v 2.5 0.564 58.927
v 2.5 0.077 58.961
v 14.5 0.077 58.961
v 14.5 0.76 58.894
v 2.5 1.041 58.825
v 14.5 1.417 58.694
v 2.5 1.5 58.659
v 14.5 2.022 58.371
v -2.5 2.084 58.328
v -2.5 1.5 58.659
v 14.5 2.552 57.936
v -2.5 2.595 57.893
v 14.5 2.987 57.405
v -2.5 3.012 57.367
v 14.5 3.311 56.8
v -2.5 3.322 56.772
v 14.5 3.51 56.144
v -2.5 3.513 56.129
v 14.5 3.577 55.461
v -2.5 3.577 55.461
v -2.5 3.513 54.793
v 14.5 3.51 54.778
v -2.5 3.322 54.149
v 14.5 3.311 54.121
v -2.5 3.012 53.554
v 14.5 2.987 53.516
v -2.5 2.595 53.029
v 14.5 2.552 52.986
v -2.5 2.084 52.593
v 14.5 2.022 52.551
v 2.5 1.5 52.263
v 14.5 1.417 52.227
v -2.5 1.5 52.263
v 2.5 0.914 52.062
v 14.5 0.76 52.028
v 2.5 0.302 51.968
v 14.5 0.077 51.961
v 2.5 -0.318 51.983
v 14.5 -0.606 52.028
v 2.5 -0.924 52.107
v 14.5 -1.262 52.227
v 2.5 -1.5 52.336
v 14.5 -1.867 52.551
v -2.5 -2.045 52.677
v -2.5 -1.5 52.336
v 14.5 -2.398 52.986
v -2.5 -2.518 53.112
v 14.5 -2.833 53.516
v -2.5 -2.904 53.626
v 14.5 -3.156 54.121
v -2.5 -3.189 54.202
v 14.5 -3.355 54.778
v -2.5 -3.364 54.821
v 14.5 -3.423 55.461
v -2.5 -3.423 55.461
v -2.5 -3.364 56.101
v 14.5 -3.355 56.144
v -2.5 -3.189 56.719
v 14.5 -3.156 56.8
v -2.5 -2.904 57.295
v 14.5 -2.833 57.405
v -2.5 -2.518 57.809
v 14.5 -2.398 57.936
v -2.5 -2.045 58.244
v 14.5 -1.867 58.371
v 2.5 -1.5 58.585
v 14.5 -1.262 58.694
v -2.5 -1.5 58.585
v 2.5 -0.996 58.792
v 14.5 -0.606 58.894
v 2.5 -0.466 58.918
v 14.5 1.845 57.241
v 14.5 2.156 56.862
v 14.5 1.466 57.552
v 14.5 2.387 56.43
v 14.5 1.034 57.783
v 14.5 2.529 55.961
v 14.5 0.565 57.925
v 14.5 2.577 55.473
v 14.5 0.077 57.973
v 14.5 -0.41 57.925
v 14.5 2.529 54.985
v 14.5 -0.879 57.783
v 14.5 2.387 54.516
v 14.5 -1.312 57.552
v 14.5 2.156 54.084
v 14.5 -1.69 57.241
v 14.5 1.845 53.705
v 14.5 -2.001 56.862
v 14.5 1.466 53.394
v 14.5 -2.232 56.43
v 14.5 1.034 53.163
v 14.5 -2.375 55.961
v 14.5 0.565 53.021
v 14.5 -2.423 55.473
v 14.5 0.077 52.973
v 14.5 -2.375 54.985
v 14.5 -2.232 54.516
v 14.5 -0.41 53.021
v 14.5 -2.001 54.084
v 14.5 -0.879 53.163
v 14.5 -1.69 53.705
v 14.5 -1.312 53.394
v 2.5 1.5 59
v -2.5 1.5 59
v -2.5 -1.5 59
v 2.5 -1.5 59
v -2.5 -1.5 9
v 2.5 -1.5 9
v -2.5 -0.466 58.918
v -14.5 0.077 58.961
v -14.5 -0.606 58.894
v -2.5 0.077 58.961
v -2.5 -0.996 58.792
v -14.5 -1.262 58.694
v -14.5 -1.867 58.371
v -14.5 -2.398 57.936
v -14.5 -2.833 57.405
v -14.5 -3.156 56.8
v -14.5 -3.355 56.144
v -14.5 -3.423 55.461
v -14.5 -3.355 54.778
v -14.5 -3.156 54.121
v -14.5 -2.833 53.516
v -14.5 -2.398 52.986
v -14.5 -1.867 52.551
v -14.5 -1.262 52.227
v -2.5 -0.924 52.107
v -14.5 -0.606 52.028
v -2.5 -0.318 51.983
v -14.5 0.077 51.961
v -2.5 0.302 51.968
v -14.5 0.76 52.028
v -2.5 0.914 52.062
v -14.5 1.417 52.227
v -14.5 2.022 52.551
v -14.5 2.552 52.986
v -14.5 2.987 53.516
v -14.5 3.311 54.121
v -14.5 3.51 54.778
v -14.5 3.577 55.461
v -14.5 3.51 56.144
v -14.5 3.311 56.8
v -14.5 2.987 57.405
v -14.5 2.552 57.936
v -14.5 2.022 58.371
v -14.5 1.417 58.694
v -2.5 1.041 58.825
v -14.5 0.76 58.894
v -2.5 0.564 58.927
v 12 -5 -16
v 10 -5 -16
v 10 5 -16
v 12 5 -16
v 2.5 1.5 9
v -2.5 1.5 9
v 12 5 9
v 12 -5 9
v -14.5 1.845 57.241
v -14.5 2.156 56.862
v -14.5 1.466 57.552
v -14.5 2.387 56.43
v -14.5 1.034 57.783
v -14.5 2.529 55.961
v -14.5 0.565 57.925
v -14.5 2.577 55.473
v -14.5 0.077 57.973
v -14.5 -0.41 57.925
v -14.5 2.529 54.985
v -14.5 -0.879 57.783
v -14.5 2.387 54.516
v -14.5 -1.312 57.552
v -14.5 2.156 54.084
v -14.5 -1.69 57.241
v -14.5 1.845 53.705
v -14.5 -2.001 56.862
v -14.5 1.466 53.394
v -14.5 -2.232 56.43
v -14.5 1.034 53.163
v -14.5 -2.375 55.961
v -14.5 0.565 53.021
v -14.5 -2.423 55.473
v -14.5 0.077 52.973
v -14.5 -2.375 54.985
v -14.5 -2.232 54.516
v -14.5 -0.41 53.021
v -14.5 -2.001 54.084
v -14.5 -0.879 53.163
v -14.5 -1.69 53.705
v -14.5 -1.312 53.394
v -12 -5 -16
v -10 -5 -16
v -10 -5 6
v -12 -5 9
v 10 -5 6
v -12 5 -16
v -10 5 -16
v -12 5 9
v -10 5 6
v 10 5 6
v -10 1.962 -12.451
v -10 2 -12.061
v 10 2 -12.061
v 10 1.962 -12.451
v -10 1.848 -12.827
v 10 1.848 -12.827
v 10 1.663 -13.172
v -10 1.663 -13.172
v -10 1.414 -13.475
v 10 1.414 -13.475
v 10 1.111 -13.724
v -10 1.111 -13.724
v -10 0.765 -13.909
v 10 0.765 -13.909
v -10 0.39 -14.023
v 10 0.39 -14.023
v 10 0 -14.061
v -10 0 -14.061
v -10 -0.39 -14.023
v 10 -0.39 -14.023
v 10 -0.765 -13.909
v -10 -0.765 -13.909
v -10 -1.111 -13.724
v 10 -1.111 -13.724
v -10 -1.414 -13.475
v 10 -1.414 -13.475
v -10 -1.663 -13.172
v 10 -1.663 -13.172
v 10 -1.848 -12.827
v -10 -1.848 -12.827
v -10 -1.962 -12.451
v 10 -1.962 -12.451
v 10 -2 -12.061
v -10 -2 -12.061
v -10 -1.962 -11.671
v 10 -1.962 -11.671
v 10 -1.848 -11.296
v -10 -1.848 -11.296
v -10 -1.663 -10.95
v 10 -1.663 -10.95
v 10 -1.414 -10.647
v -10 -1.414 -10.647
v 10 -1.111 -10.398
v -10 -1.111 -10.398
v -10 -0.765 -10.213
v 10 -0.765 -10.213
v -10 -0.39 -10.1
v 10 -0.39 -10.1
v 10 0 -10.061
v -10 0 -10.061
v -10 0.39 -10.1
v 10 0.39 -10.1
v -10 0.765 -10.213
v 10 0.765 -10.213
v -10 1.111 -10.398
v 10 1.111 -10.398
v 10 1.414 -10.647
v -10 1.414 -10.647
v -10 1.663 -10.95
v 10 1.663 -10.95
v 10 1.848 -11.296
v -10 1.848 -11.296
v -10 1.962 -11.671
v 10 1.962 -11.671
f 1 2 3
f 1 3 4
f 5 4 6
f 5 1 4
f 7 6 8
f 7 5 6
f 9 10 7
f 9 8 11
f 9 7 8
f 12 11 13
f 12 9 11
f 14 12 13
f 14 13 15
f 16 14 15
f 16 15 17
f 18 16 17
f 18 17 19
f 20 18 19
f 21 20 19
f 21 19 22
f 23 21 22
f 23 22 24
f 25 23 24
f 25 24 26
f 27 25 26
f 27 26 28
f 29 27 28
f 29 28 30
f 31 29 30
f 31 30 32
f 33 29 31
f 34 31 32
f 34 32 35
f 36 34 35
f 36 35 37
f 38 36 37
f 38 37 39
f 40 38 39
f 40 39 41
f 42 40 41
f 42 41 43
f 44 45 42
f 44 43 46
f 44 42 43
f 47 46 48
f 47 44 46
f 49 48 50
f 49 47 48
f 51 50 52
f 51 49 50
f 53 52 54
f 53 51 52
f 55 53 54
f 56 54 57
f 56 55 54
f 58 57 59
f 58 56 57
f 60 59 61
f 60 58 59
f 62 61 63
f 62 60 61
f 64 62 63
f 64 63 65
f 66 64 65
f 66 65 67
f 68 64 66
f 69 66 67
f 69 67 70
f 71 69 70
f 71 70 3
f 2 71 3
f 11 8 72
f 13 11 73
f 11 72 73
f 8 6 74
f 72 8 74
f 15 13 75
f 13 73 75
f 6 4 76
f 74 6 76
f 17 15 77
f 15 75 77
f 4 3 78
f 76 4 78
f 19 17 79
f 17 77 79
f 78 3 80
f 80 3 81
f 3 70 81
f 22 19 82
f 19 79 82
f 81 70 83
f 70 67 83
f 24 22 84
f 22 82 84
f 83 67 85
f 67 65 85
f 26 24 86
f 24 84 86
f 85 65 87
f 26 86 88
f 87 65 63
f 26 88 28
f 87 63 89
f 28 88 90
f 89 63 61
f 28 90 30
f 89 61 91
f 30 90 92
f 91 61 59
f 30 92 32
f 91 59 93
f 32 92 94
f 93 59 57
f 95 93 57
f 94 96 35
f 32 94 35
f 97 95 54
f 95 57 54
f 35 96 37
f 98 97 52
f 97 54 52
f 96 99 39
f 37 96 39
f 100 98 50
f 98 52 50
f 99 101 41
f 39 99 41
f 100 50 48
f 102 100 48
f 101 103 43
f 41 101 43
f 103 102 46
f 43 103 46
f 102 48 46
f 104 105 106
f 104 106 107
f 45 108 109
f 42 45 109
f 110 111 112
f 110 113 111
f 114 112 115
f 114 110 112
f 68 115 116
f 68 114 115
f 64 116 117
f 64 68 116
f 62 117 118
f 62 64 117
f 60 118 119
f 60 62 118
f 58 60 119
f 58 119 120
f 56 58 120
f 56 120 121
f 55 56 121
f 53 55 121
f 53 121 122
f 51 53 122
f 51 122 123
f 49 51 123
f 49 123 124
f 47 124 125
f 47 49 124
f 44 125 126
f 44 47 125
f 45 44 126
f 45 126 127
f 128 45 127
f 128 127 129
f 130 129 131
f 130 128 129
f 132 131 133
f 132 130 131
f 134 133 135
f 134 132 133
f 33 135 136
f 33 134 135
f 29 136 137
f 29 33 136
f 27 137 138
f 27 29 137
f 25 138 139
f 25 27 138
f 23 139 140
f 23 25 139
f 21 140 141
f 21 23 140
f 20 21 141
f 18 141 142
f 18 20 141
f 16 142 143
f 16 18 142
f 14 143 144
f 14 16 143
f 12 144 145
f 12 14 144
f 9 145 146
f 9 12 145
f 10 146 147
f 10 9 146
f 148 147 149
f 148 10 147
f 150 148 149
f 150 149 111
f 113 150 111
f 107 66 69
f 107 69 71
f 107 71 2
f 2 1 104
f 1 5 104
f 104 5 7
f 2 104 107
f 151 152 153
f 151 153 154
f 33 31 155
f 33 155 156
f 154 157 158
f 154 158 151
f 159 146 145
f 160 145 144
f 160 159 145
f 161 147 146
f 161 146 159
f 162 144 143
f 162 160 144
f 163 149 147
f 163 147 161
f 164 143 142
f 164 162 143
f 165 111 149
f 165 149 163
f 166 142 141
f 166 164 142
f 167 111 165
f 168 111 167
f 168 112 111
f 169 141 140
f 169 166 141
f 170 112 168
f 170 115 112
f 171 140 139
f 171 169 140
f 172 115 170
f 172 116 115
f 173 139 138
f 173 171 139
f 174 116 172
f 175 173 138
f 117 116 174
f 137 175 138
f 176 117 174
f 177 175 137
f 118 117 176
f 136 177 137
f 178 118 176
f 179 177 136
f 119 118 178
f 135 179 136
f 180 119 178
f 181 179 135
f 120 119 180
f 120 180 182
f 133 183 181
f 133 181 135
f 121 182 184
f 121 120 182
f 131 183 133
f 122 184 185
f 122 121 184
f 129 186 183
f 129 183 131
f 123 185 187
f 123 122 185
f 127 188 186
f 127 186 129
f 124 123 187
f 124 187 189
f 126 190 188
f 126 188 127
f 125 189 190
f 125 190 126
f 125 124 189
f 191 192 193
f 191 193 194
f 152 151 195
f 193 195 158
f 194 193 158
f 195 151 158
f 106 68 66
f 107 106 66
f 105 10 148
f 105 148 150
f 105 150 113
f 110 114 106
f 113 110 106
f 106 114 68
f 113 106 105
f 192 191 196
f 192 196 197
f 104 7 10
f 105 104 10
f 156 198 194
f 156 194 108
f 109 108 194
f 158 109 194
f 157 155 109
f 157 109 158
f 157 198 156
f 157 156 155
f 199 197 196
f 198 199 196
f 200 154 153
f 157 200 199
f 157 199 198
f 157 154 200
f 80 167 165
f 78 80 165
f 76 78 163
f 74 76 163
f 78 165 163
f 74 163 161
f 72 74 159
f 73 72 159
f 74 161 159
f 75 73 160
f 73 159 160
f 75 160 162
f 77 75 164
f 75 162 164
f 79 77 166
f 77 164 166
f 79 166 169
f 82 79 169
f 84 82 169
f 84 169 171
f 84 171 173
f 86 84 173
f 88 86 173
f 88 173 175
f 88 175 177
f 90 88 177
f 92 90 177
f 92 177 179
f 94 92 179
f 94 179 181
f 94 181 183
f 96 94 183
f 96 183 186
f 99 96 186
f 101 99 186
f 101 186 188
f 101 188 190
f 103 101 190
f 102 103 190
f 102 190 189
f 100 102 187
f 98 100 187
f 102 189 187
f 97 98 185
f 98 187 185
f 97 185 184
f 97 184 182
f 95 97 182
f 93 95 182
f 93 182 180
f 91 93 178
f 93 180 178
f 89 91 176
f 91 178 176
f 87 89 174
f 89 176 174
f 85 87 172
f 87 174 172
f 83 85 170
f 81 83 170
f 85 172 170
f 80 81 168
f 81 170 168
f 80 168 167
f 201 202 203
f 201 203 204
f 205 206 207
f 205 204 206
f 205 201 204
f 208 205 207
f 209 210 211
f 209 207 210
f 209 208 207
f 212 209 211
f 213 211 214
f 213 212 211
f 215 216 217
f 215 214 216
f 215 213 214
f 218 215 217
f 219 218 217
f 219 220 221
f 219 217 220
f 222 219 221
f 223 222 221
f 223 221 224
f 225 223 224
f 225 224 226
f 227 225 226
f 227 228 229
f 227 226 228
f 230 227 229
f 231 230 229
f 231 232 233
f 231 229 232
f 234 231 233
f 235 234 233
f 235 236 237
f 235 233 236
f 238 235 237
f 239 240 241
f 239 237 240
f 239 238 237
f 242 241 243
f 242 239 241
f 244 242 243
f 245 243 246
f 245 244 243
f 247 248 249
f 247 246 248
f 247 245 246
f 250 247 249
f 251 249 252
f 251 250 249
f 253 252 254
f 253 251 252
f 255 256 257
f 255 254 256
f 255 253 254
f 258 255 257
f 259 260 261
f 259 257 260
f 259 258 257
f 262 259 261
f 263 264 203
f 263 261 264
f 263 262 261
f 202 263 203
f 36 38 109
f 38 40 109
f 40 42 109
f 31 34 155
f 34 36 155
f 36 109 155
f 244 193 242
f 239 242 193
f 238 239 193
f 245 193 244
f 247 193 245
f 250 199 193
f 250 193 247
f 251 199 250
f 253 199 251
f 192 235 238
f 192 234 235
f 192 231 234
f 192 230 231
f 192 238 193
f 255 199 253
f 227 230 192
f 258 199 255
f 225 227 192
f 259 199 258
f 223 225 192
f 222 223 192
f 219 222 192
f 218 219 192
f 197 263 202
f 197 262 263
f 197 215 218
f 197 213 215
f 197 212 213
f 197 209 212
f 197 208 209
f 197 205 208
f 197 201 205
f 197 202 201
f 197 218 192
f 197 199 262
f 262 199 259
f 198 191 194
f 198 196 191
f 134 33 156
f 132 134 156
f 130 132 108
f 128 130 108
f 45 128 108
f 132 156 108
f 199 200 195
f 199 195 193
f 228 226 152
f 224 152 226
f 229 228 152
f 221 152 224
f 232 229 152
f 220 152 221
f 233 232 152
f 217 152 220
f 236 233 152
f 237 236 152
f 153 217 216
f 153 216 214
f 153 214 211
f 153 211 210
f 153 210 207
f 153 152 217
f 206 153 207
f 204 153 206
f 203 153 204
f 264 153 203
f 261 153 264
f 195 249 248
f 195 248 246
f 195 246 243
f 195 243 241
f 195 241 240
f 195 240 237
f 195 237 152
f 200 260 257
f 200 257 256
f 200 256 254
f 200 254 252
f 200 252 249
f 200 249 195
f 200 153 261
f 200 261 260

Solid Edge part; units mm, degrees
sketch "Sketch1" plane through (0, 0, 0) normal (0, -1, 0) x (1, 0, 0)
  line L0 (-12, 9) -> (12, 9)
  line L1 (12, 9) -> (12, -16)
  line L2 (10, -16) -> (12, -16)
  line L3 (10, -16) -> (10, 6)
  line L4 (10, 6) -> (-10, 6)
  line L5 (-10, 6) -> (-10, -16)
  line L6 (-12, -16) -> (-10, -16)
  line L7 (-12, -16) -> (-12, 9)
extrude "Protrusion1" add sketch "Sketch1" along normal mid plane 10
sketch "Sketch2" plane through (-10, 0, -5) normal (1, 0, 0) x (0, 1, 0)
  circle A0 centre (0, -7.0612) radius 2
extrude "ExtrudedProtrusion_5" add sketch "Sketch2" along normal blind 20
sketch "Sketch3" plane through (0, 0, 9) normal (0, 0, 1) x (1, 0, 0)
  line L0 (2.5, -1.5) -> (2.5, 1.5)
  line L1 (2.5, 1.5) -> (-2.5, 1.5)
  line L2 (-2.5, 1.5) -> (-2.5, -1.5)
  line L3 (-2.5, -1.5) -> (2.5, -1.5)
extrude "ExtrudedProtrusion_6" add sketch "Sketch3" along normal blind 50
sketch "Sketch4" plane through (-2.5, 0, 34) normal (-1, 0, 0) x (0, 0, 1)
  circle A0 centre (21.4608, 0.0773) radius 3.5
extrude "ExtrudedProtrusion_8" add sketch "Sketch4" along normal blind 12 and the other way blind 17
sketch "Sketch5" plane through (-16.5, 0.0773, 55.4608) normal (-1, 0, 0) x (0, 0, 1)
  circle A0 centre (0.0121, 0) radius 2.5
extrude "ExtrudedCutout_1" cut sketch "Sketch5" against normal blind 62.1313
